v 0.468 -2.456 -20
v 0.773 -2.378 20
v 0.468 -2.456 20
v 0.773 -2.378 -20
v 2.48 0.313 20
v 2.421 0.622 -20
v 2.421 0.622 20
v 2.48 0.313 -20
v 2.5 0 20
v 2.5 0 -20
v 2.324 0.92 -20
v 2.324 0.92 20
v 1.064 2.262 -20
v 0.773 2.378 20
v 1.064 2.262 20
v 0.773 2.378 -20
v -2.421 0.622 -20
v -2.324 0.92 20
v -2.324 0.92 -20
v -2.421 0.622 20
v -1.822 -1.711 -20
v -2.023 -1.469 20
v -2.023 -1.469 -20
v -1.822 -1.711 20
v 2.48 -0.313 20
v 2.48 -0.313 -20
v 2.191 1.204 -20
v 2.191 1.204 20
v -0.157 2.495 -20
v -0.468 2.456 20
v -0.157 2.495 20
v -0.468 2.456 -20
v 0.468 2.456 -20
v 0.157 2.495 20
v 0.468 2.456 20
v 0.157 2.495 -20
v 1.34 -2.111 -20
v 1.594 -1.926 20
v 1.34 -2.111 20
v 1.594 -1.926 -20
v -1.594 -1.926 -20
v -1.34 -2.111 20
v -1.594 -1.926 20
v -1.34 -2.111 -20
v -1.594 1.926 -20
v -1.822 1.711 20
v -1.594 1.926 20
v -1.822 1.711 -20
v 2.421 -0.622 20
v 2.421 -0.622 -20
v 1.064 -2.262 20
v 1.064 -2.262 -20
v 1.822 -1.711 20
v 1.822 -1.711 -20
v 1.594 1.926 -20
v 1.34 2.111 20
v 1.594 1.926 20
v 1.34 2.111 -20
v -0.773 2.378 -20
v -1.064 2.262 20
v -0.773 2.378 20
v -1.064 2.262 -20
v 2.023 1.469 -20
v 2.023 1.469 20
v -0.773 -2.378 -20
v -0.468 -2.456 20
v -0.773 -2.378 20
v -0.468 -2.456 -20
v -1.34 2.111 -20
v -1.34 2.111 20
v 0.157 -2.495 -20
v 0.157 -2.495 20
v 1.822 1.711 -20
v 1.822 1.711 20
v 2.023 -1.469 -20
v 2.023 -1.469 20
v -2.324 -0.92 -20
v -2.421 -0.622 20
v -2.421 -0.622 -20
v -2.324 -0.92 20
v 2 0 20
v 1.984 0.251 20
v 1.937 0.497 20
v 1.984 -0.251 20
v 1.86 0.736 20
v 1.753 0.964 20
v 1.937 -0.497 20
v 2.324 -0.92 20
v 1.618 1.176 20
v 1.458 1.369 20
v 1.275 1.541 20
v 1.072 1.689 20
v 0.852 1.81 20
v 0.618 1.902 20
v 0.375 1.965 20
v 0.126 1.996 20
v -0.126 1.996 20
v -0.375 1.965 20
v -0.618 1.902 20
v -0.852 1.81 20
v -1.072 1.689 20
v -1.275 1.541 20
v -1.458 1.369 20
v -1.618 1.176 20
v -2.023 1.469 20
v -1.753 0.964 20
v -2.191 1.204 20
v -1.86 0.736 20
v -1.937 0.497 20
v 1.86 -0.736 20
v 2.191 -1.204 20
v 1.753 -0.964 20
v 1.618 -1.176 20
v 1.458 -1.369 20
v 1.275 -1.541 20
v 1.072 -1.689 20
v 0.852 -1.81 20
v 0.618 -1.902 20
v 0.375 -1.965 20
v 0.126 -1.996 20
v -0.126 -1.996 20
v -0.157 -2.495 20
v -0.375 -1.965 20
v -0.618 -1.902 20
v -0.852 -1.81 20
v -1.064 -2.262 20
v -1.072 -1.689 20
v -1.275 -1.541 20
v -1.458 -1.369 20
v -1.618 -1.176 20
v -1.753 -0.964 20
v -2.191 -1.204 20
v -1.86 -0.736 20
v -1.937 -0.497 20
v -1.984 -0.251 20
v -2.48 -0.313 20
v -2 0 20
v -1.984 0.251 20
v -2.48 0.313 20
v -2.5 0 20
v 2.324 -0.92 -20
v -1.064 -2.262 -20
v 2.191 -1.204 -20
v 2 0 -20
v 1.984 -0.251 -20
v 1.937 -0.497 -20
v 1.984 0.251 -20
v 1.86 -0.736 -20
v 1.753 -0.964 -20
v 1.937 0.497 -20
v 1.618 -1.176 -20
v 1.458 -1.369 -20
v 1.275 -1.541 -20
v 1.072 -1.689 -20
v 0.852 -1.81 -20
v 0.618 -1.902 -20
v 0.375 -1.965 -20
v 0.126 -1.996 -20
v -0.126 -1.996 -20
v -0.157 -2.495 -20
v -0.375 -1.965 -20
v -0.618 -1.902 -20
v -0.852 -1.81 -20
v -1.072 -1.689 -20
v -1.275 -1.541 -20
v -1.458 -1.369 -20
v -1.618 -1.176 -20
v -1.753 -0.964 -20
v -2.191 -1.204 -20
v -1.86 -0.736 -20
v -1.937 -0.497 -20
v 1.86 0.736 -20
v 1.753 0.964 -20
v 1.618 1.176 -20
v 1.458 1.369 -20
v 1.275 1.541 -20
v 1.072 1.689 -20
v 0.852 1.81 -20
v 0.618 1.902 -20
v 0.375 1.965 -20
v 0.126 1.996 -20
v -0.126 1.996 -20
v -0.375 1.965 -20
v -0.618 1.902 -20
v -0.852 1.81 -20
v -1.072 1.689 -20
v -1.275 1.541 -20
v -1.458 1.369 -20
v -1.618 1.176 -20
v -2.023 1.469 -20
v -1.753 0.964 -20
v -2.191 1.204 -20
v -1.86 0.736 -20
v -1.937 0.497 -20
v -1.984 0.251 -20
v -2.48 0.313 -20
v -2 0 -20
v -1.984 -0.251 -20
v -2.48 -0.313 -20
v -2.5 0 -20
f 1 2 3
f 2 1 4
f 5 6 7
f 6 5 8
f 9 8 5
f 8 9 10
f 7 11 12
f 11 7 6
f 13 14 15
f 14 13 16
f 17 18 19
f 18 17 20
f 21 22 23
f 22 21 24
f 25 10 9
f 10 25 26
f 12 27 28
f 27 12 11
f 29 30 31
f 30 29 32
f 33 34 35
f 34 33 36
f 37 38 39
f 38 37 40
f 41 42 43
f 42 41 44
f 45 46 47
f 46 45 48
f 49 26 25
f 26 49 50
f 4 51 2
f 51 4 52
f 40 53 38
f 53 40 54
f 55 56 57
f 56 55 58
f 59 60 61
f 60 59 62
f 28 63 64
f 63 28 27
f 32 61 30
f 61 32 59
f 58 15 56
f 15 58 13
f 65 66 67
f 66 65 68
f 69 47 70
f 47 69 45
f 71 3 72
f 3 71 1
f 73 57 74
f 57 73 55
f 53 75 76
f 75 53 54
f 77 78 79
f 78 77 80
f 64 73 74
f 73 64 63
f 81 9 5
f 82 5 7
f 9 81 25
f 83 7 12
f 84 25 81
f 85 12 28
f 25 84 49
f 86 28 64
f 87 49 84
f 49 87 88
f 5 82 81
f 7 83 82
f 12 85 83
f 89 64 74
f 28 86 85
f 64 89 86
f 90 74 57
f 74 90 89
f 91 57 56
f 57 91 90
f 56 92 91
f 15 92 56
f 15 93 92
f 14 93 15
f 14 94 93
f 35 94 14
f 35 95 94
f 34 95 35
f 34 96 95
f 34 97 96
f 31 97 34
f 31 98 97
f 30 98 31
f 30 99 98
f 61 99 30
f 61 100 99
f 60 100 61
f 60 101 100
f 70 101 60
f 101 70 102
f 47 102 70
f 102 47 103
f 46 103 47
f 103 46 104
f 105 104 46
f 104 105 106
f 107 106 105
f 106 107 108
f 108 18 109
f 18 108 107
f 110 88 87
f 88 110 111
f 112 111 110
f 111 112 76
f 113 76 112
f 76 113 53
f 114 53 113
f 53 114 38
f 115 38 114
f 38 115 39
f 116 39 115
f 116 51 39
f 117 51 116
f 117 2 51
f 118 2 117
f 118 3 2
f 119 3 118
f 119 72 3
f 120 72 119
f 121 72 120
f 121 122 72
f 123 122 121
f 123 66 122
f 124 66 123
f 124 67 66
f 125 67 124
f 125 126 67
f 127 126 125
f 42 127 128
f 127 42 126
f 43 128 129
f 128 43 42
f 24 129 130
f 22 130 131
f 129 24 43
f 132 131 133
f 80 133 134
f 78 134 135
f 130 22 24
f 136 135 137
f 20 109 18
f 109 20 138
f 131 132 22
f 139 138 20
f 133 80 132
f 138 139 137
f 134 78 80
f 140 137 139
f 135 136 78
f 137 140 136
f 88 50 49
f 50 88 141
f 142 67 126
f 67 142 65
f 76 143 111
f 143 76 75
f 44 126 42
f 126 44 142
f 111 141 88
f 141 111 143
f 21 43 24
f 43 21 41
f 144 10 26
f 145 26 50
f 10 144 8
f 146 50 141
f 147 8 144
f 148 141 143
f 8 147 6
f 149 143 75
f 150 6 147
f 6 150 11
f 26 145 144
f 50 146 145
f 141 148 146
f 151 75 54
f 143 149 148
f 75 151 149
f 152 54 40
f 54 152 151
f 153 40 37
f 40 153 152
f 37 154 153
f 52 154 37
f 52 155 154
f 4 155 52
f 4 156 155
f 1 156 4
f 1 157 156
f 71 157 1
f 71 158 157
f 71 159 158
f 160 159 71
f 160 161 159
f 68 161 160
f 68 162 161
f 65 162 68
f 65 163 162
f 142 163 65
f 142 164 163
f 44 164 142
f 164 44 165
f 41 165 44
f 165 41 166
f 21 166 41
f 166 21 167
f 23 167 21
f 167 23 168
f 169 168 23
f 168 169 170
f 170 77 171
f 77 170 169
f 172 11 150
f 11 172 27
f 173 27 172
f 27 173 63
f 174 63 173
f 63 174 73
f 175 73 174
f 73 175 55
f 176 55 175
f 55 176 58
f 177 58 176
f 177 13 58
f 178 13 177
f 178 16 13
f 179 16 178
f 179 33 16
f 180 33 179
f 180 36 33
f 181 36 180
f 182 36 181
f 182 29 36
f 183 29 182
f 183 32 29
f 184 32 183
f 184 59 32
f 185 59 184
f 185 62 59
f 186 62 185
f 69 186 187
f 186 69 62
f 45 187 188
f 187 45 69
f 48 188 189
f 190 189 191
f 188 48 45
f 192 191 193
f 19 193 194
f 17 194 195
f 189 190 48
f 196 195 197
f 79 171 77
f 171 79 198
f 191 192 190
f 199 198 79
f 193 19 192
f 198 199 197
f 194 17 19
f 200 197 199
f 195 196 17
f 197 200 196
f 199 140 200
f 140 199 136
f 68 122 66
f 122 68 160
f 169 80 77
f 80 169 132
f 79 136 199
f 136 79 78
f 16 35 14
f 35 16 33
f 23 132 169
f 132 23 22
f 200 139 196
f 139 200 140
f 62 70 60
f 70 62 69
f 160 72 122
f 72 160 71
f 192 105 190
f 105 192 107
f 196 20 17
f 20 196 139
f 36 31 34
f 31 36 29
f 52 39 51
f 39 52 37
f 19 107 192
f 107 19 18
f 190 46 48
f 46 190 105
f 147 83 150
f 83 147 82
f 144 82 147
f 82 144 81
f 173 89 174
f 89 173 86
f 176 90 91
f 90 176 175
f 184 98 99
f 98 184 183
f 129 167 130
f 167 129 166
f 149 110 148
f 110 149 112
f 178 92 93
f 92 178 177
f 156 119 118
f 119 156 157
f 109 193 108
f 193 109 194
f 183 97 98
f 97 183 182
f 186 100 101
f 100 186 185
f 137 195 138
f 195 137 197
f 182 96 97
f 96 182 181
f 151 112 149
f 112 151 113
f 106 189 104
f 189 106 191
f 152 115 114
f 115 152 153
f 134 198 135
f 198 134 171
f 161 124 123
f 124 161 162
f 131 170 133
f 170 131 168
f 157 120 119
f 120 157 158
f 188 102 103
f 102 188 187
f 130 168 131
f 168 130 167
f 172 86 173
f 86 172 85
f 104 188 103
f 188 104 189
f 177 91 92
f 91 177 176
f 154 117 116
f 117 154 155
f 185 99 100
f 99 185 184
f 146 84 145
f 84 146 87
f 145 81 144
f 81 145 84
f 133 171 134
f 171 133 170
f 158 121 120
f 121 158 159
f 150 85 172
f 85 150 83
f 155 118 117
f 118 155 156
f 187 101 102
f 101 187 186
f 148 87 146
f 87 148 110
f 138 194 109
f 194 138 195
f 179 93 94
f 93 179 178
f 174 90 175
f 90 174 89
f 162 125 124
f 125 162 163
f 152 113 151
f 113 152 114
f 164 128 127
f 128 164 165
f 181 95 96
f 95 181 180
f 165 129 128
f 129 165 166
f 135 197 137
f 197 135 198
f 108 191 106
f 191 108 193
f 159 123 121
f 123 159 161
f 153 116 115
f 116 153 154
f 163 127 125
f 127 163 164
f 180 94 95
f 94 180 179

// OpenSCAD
$fn = 50;


difference() {
	union() {
		translate(v = [0, 0, -20.0000000000]) {
			cylinder(h = 40, r = 2.5000000000);
		}
	}
	union() {
		translate(v = [0, 0, -100.0000000000]) {
			cylinder(h = 200, r = 2.0000000000);
		}
	}
}
